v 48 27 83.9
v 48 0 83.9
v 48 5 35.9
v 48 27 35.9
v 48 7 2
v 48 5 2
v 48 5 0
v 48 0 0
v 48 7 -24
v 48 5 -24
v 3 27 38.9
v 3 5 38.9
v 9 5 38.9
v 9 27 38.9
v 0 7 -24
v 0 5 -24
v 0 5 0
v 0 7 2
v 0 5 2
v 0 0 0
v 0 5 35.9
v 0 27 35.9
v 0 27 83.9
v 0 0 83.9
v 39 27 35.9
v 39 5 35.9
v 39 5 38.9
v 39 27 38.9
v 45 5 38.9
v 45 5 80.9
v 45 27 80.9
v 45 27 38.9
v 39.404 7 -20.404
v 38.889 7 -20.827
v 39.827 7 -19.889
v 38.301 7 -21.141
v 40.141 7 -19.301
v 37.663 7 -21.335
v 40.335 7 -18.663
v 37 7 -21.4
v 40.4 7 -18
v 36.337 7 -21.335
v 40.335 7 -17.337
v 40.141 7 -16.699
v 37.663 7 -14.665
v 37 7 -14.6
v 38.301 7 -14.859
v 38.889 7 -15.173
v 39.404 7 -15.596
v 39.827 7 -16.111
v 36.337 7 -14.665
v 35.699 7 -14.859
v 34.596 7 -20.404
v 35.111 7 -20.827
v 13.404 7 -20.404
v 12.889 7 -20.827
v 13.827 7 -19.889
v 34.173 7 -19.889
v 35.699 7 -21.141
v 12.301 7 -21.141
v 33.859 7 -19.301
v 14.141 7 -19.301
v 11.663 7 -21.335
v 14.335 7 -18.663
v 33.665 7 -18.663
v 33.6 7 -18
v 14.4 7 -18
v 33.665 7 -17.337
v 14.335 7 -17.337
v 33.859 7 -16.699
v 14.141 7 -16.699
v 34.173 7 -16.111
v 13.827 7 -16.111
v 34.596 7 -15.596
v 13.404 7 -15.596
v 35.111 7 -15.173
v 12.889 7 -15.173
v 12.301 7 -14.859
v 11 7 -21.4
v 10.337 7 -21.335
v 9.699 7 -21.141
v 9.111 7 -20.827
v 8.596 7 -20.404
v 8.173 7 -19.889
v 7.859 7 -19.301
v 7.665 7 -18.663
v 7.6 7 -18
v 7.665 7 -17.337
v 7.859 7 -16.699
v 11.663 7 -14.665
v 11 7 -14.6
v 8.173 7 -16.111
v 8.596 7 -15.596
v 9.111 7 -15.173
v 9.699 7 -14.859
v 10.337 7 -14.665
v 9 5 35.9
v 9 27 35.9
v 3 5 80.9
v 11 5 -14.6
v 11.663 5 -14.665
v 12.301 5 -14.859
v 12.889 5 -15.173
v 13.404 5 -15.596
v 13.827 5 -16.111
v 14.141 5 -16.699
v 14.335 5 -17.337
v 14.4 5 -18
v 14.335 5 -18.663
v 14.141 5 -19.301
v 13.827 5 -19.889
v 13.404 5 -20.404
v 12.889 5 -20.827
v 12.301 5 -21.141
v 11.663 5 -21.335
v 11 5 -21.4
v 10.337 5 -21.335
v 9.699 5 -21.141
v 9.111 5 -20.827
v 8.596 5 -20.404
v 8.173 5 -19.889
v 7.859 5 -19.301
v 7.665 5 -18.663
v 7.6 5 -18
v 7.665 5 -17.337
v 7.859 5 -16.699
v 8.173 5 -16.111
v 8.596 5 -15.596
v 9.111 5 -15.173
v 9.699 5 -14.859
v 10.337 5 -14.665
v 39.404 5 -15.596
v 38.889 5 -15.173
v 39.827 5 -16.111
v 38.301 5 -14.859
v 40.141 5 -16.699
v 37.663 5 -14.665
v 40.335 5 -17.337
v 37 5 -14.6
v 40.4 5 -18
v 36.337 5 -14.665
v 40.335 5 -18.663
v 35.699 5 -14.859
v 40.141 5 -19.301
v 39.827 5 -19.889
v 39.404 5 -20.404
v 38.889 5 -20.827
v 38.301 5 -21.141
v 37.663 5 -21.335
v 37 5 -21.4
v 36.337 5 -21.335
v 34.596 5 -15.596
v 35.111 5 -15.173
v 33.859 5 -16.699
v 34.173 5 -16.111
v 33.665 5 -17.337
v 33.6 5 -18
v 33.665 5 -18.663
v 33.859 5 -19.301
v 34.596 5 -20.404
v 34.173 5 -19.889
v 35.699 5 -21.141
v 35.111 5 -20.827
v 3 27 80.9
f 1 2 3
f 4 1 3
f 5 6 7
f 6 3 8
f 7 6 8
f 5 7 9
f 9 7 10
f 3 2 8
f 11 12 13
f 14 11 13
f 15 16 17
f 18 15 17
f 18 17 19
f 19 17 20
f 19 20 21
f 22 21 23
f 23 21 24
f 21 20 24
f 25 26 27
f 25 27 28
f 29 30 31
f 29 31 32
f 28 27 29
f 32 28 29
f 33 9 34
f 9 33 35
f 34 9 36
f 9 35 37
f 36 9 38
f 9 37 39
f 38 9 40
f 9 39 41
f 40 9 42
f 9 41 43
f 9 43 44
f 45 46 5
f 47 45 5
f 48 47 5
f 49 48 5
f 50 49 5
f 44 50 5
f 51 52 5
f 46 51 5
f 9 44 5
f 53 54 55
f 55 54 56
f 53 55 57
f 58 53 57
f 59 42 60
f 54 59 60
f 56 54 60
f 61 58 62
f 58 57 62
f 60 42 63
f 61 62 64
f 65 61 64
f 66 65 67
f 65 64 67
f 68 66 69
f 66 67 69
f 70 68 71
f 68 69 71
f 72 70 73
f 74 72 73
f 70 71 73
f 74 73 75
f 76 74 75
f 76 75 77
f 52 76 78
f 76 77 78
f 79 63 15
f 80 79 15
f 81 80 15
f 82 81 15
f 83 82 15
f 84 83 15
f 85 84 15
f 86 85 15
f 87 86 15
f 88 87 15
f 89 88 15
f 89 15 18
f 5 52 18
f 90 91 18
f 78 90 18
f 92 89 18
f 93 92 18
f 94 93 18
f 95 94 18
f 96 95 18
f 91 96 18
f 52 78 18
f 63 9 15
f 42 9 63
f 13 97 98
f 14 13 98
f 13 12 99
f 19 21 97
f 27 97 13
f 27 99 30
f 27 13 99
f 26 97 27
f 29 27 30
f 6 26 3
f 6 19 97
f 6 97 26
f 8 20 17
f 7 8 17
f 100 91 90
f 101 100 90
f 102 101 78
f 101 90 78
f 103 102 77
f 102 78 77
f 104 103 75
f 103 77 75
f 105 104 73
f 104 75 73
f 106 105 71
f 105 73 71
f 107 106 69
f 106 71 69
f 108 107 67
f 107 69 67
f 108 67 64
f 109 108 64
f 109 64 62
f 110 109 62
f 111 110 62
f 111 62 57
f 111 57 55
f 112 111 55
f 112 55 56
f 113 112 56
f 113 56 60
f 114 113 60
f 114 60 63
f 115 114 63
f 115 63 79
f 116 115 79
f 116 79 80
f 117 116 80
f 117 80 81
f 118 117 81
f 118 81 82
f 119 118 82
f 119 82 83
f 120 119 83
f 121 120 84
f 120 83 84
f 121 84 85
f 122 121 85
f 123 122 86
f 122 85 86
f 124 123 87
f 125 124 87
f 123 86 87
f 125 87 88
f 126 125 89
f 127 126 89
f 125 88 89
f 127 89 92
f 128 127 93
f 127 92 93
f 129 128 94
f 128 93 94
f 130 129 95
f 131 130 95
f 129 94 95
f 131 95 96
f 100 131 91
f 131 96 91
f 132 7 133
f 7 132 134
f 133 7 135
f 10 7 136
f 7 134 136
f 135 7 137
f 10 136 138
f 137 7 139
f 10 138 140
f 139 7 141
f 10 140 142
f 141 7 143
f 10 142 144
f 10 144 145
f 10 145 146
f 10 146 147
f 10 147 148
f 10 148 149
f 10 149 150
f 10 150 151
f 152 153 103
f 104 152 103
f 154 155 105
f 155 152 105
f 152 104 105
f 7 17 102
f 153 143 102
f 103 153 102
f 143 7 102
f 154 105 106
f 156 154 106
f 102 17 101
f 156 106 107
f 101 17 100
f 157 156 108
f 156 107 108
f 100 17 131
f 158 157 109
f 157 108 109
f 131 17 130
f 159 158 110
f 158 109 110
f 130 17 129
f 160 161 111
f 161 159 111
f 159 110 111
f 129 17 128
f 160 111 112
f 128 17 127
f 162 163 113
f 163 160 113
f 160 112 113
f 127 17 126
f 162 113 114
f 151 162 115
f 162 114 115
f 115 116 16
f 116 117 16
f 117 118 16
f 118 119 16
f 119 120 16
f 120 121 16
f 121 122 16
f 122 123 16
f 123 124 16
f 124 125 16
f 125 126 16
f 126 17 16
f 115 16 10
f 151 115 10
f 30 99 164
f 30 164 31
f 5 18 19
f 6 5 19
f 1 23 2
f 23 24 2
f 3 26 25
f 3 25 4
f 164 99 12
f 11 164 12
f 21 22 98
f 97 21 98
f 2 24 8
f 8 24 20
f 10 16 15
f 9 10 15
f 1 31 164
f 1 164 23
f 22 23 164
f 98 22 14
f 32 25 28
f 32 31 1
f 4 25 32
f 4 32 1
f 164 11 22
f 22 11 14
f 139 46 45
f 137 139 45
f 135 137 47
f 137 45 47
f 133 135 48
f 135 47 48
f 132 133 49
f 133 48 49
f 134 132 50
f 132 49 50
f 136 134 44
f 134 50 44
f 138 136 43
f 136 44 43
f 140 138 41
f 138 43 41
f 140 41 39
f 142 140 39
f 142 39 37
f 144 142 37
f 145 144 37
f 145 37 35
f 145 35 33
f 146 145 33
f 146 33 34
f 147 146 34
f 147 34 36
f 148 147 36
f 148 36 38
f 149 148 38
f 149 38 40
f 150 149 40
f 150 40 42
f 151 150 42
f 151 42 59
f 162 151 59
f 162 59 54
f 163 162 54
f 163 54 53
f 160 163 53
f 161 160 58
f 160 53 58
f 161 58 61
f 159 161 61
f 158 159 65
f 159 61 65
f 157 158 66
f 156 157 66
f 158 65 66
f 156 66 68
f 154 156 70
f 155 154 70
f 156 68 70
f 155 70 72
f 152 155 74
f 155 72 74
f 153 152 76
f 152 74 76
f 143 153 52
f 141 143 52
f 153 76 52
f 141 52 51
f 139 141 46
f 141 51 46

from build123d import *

# Parameters (mm, degrees)
BOSS_EXTRUDE1_DEPTH = 48
SKETCH4_W           = 48
SKETCH4_H           = 48
SKETCH4_W_2         = 42
SKETCH4_H_2         = 42
BOSS_EXTRUDE2_DEPTH = 25
SKETCH5_W           = 42
SKETCH5_H           = 42
BOSS_EXTRUDE3_DEPTH = 3
SKETCH7_R           = 3.4
CUT_EXTRUDE1_DEPTH  = 99.707699801
SKETCH8_W           = 30
SKETCH8_H           = 25
CUT_EXTRUDE3_DEPTH  = 10
BOSS_EXTRUDE4_DEPTH = 3


with BuildPart() as part:
    # Sketch3 → Boss-Extrude1 (new body)
    with BuildSketch(Plane(origin=(0, 0, 0), x_dir=(0, 0, -1), z_dir=(1, 0, 0))):
        Polygon((0, 0), (0, 5), (24, 5), (24, 7), (-2, 7), (-2, 2), (-83.9, 2), (-83.9, 0), align=None)
    extrude(amount=BOSS_EXTRUDE1_DEPTH)

    # Sketch4 → Boss-Extrude2 (add)
    with BuildSketch(Plane(origin=(0, 2, 0), x_dir=(1, 0, 0), z_dir=(0, 1, 0))):
        with Locations((24, -59.9)):
            Rectangle(SKETCH4_W, SKETCH4_H)
        with Locations((24, -59.9)):
            Rectangle(SKETCH4_W_2, SKETCH4_H_2, mode=Mode.SUBTRACT)
    extrude(amount=BOSS_EXTRUDE2_DEPTH)

    # Sketch5 → Boss-Extrude3 (add)
    with BuildSketch(Plane(origin=(0, 2, 0), x_dir=(1, 0, 0), z_dir=(0, 1, 0))):
        with Locations((24, -59.9)):
            Rectangle(SKETCH5_W, SKETCH5_H)
    extrude(amount=BOSS_EXTRUDE3_DEPTH)

    # Sketch7 → Cut-Extrude1 (cut, through all)
    with BuildSketch(Plane(origin=(0, 7, 0), x_dir=(1, 0, 0), z_dir=(0, 1, 0))):
        with Locations(Location((11, 18, 0), (0, 0, 270))):
            Circle(SKETCH7_R)
        with Locations(Location((37, 18, 0), (0, 0, 270))):
            Circle(SKETCH7_R)
    extrude(amount=-CUT_EXTRUDE1_DEPTH, mode=Mode.SUBTRACT)

    # Sketch8 → Cut-Extrude3 (cut)
    with BuildSketch(Plane(origin=(0, 0, 35.9), x_dir=(-1, 0, 0), z_dir=(0, 0, -1))):
        with Locations((-24, 14.5)):
            Rectangle(SKETCH8_W, SKETCH8_H)
    extrude(amount=-CUT_EXTRUDE3_DEPTH, mode=Mode.SUBTRACT)

    # Sketch9 → Boss-Extrude4 (add)
    with BuildSketch(Plane(origin=(0, 2, 0), x_dir=(1, 0, 0), z_dir=(0, 1, 0))):
        Polygon((0, -2), (0, -35.9), (9, -35.9), (9, -45.9), (39, -45.9), (39, -35.9), (48, -35.9), (48, -2), align=None)
    extrude(amount=BOSS_EXTRUDE4_DEPTH)


solid = part.part
